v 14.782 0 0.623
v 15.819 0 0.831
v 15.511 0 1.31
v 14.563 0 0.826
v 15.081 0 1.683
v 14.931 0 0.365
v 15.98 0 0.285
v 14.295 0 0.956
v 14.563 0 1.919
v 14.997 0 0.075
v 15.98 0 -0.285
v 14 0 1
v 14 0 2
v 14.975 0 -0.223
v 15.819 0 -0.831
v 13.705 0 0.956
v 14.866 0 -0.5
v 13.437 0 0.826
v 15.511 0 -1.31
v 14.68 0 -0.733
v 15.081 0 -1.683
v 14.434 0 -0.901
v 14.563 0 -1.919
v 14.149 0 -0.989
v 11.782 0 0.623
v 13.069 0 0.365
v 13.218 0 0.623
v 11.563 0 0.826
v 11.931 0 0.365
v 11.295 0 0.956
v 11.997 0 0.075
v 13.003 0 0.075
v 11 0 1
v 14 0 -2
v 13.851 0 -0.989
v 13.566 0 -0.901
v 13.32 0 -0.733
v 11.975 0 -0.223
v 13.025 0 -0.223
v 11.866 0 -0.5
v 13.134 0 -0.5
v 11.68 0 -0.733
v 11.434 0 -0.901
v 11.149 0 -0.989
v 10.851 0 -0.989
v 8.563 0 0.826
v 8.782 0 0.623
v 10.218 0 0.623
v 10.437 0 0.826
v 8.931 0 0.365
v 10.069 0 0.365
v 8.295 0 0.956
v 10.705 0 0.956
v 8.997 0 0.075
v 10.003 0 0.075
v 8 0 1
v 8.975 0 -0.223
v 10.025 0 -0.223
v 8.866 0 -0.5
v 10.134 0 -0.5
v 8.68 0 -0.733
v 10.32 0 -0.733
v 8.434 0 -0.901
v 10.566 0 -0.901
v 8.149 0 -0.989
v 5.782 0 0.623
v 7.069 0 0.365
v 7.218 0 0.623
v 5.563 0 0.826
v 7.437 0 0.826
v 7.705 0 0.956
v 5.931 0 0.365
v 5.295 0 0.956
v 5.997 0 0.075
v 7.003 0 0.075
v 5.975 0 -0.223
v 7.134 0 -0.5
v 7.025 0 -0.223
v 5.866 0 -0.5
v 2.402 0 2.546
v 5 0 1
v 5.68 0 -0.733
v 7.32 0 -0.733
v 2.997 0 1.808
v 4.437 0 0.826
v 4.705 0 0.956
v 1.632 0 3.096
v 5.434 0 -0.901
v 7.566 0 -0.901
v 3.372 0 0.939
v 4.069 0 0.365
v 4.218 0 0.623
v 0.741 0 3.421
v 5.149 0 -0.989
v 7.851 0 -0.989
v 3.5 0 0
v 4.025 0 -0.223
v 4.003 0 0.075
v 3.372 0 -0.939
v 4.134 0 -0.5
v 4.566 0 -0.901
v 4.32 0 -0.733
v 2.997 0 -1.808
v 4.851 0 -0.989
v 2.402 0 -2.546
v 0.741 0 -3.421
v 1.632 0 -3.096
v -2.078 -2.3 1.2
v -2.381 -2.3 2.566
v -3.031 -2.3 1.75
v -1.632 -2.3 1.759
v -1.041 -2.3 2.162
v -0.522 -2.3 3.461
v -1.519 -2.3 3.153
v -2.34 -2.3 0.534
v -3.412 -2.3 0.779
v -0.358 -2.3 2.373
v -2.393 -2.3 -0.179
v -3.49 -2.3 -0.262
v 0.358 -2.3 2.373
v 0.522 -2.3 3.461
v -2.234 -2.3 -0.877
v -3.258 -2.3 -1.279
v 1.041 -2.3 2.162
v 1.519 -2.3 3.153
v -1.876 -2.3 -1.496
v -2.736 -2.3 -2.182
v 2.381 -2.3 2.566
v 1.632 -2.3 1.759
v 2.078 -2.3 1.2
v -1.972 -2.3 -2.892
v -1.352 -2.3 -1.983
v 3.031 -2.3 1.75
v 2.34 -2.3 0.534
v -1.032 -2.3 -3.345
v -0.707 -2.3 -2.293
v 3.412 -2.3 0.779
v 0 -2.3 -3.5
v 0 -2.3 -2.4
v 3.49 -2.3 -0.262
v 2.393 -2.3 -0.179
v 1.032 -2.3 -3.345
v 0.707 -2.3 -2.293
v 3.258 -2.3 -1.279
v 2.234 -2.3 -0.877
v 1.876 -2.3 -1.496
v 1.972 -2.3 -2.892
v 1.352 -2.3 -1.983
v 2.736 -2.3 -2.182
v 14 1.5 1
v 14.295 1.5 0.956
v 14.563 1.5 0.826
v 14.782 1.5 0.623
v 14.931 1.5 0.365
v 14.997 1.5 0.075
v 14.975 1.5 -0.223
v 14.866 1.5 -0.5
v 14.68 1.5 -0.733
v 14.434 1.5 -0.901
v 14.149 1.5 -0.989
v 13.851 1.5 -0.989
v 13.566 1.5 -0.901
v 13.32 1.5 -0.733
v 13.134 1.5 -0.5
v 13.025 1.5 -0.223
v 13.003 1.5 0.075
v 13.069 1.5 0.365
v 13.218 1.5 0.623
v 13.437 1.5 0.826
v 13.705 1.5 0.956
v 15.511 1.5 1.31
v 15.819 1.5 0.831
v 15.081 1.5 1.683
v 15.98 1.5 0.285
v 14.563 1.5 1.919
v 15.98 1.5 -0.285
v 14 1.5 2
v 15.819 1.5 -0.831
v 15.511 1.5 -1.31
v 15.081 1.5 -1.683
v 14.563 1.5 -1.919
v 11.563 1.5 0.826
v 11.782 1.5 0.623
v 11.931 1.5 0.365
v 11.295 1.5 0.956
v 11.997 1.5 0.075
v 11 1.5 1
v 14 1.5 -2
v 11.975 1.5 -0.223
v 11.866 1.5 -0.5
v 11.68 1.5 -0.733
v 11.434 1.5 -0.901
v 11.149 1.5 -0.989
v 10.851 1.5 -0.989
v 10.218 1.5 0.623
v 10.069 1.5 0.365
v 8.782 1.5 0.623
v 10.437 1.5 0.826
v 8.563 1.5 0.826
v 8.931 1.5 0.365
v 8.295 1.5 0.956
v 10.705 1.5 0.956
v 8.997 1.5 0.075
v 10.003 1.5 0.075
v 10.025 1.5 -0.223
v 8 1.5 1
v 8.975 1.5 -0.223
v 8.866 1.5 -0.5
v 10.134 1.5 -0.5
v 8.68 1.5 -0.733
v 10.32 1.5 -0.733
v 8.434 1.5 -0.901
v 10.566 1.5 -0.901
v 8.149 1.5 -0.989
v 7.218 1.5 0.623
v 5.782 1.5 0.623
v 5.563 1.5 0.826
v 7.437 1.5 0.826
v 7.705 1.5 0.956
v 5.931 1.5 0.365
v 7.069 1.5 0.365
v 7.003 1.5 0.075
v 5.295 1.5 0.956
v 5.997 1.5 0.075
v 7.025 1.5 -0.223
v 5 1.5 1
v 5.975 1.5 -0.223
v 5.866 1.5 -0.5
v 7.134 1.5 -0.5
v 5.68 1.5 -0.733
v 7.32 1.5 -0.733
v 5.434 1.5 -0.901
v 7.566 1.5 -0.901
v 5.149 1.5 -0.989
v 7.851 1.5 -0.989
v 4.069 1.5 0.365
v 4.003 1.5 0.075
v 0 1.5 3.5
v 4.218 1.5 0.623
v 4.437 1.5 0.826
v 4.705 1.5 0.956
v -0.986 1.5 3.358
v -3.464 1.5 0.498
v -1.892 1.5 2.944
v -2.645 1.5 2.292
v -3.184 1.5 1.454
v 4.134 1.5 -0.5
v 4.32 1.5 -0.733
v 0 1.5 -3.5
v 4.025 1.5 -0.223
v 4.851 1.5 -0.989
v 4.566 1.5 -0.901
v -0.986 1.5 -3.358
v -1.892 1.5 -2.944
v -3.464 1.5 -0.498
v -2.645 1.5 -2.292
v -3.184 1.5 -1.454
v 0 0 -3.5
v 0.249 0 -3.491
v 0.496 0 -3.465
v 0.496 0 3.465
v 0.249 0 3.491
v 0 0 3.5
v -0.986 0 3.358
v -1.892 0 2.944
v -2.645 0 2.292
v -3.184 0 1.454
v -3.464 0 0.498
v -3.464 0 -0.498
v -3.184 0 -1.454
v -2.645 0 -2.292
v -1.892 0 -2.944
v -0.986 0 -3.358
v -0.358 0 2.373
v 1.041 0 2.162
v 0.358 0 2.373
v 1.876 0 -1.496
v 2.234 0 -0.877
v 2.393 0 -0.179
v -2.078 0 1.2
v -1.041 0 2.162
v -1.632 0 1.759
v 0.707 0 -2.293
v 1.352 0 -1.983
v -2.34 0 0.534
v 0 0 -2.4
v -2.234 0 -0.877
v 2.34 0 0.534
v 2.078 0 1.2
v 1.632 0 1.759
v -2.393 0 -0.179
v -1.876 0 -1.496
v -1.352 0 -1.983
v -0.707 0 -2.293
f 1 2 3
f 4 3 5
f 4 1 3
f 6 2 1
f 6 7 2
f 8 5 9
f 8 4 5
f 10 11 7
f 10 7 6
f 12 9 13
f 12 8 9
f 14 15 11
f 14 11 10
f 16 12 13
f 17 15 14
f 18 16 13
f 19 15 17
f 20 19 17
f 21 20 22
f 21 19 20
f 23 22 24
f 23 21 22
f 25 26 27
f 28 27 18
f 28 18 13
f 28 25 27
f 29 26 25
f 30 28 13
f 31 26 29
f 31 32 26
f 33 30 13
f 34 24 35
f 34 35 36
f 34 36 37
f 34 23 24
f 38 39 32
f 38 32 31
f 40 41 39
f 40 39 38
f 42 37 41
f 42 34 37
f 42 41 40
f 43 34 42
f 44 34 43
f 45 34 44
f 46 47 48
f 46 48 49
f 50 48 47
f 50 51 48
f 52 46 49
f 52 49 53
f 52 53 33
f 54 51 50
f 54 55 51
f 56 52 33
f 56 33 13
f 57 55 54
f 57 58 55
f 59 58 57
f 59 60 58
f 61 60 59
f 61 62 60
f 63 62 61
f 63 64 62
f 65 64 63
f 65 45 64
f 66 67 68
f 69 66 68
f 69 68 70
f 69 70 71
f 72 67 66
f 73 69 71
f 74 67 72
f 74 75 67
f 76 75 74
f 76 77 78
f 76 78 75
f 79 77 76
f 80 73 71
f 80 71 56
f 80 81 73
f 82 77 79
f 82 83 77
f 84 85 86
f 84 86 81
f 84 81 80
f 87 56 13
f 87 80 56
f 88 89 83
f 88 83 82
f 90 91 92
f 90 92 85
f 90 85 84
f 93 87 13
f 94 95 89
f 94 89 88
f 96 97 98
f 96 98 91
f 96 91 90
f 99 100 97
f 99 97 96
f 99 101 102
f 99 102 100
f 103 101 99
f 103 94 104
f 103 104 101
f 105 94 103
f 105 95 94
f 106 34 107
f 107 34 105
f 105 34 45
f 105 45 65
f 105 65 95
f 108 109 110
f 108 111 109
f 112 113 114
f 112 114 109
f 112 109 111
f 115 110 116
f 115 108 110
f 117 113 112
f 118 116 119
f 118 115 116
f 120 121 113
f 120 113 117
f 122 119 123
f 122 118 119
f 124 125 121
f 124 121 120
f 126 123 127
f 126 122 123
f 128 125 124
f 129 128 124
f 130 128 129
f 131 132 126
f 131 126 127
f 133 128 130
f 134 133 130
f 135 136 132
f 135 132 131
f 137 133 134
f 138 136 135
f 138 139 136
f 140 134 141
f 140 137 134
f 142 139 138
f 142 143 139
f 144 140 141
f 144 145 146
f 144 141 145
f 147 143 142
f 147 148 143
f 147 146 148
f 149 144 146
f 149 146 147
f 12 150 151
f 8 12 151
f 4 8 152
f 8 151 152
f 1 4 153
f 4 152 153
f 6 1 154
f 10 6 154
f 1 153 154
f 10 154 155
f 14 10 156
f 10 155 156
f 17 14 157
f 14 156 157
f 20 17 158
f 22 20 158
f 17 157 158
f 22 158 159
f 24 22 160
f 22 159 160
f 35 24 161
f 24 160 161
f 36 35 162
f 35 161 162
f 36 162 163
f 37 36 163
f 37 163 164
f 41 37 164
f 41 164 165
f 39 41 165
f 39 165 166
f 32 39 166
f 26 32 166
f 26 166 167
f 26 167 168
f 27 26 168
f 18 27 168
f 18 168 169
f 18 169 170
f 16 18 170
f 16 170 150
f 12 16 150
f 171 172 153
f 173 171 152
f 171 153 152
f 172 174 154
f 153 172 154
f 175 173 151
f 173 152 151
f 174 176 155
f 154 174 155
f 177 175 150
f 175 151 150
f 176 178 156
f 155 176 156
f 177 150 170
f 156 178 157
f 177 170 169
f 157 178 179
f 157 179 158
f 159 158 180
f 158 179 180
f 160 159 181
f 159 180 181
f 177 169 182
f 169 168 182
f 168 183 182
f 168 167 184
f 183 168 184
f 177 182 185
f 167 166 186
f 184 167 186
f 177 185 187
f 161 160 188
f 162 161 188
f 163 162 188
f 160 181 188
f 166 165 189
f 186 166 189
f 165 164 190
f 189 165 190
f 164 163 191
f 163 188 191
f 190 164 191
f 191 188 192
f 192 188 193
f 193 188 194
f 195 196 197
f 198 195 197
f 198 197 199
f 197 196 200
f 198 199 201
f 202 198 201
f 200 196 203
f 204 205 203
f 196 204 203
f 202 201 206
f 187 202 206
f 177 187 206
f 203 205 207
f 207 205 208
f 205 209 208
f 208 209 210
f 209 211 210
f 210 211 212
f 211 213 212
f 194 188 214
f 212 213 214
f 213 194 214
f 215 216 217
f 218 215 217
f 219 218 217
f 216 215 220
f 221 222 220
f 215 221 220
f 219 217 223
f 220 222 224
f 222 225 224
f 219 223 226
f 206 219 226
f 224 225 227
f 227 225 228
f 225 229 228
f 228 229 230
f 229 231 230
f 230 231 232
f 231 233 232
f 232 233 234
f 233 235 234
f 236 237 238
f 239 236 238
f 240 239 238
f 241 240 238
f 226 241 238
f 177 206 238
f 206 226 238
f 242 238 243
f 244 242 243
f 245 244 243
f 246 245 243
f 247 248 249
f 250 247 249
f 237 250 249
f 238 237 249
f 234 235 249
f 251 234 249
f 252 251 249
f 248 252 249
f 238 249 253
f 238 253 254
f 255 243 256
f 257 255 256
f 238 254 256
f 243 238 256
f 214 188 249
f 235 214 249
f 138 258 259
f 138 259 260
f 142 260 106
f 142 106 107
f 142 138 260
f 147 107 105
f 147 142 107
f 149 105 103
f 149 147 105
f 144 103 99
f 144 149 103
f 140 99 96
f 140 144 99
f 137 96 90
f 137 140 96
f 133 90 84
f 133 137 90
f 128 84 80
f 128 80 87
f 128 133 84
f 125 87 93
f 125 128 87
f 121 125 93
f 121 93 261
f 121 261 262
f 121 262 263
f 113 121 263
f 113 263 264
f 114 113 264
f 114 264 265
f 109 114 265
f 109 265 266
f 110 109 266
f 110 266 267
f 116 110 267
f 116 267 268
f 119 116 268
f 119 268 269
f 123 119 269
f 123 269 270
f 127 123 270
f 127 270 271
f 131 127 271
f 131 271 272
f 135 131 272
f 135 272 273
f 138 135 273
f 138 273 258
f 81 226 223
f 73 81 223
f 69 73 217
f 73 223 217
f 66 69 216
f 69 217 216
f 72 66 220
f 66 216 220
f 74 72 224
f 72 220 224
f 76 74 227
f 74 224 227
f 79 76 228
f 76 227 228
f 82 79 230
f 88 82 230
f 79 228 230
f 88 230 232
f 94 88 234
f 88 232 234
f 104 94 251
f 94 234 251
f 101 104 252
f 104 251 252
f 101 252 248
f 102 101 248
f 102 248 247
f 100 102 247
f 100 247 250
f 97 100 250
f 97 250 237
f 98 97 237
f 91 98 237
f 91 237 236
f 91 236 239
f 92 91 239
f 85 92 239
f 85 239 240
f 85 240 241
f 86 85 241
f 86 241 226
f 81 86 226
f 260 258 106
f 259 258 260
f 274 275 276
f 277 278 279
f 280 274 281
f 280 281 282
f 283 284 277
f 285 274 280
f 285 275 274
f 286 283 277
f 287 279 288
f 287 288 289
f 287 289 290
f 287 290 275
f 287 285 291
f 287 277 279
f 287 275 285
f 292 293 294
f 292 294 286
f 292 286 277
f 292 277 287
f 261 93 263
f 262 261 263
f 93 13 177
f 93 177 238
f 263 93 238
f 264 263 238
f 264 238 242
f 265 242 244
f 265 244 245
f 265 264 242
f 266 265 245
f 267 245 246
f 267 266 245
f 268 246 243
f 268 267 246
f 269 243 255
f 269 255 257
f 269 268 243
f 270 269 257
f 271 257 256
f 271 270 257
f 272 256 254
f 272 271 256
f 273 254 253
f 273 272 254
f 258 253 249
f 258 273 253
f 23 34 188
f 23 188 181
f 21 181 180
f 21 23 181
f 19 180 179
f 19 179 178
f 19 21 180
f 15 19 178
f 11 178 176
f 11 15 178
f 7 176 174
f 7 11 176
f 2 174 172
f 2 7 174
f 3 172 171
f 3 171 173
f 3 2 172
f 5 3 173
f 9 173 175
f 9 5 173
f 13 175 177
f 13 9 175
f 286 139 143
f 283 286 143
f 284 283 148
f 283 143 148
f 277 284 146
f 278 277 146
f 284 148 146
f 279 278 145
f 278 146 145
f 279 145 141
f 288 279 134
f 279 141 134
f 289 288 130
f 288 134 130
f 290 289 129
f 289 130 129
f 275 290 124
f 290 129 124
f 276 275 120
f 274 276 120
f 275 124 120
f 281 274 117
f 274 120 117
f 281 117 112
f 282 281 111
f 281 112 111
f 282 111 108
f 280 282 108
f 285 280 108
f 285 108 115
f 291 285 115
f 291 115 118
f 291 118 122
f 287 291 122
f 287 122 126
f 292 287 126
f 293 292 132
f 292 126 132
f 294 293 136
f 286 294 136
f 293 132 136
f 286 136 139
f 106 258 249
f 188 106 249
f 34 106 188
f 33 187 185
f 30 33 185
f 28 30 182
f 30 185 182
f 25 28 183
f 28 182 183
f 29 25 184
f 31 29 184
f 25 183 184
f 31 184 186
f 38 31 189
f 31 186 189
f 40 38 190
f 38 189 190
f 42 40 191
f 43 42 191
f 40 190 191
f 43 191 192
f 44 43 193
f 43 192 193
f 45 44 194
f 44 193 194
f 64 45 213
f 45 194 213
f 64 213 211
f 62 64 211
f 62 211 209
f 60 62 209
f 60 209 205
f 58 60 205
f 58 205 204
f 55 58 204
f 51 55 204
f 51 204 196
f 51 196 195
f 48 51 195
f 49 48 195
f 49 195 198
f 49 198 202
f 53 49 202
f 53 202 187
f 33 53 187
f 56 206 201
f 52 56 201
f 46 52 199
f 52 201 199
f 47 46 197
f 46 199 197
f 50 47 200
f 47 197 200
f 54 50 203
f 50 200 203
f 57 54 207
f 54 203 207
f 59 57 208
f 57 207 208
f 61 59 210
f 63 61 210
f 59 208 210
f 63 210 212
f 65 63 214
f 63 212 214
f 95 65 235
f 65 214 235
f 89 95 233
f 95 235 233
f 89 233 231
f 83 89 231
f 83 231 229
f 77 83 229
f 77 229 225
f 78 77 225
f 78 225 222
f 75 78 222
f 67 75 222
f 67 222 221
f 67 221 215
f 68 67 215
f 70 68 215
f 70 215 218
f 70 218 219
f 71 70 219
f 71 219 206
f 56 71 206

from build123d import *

# Parameters (mm, degrees)
BOSS_EXTRUDE1_DEPTH = 1.5
BOSS_EXTRUDE2_START = 2.3
SKETCH2_R           = 3.5
SKETCH2_R_2         = 2.4
BOSS_EXTRUDE2_DEPTH = 2.3
SKETCH3_R           = 1
CUT_EXTRUDE2_DEPTH  = 17.813387523


with BuildPart() as part:
    # Sketch1 → Boss-Extrude1 (new body)
    with BuildSketch(Plane(origin=(0, 0, 0), x_dir=(1, 0, 0), z_dir=(0, 1, 0))):
        with BuildLine():
            Line((0, 3.5), (14, 2))
            ThreePointArc((14, 2), (16, 0), (14, -2))
            Line((14, -2), (0, -3.5))
            ThreePointArc((0, -3.5), (-3.5, 0), (0, 3.5))
        make_face()
    extrude(amount=BOSS_EXTRUDE1_DEPTH)

    # Sketch2 → Boss-Extrude2 (add)
    with BuildSketch(Plane.XZ.offset(BOSS_EXTRUDE2_START)):
        with Locations(Location((0, 0, 0), (0, 0, 270))):
            Circle(SKETCH2_R)
        with Locations(Location((0, 0, 0), (0, 0, 270))):
            Circle(SKETCH2_R_2, mode=Mode.SUBTRACT)
    extrude(amount=-BOSS_EXTRUDE2_DEPTH)

    # Sketch3 → Cut-Extrude2 (cut, through all)
    with BuildSketch(Plane(origin=(0, 1.5, 0), x_dir=(1, 0, 0), z_dir=(0, 1, 0))):
        with Locations(Location((14, 0, 0), (0, 0, 270))):
            Circle(SKETCH3_R)
        with Locations(Location((11, 0, 0), (0, 0, 270))):
            Circle(SKETCH3_R)
        with Locations(Location((8, 0, 0), (0, 0, 270))):
            Circle(SKETCH3_R)
        with Locations(Location((5, 0, 0), (0, 0, 270))):
            Circle(SKETCH3_R)
    extrude(amount=-CUT_EXTRUDE2_DEPTH, mode=Mode.SUBTRACT)


solid = part.part
